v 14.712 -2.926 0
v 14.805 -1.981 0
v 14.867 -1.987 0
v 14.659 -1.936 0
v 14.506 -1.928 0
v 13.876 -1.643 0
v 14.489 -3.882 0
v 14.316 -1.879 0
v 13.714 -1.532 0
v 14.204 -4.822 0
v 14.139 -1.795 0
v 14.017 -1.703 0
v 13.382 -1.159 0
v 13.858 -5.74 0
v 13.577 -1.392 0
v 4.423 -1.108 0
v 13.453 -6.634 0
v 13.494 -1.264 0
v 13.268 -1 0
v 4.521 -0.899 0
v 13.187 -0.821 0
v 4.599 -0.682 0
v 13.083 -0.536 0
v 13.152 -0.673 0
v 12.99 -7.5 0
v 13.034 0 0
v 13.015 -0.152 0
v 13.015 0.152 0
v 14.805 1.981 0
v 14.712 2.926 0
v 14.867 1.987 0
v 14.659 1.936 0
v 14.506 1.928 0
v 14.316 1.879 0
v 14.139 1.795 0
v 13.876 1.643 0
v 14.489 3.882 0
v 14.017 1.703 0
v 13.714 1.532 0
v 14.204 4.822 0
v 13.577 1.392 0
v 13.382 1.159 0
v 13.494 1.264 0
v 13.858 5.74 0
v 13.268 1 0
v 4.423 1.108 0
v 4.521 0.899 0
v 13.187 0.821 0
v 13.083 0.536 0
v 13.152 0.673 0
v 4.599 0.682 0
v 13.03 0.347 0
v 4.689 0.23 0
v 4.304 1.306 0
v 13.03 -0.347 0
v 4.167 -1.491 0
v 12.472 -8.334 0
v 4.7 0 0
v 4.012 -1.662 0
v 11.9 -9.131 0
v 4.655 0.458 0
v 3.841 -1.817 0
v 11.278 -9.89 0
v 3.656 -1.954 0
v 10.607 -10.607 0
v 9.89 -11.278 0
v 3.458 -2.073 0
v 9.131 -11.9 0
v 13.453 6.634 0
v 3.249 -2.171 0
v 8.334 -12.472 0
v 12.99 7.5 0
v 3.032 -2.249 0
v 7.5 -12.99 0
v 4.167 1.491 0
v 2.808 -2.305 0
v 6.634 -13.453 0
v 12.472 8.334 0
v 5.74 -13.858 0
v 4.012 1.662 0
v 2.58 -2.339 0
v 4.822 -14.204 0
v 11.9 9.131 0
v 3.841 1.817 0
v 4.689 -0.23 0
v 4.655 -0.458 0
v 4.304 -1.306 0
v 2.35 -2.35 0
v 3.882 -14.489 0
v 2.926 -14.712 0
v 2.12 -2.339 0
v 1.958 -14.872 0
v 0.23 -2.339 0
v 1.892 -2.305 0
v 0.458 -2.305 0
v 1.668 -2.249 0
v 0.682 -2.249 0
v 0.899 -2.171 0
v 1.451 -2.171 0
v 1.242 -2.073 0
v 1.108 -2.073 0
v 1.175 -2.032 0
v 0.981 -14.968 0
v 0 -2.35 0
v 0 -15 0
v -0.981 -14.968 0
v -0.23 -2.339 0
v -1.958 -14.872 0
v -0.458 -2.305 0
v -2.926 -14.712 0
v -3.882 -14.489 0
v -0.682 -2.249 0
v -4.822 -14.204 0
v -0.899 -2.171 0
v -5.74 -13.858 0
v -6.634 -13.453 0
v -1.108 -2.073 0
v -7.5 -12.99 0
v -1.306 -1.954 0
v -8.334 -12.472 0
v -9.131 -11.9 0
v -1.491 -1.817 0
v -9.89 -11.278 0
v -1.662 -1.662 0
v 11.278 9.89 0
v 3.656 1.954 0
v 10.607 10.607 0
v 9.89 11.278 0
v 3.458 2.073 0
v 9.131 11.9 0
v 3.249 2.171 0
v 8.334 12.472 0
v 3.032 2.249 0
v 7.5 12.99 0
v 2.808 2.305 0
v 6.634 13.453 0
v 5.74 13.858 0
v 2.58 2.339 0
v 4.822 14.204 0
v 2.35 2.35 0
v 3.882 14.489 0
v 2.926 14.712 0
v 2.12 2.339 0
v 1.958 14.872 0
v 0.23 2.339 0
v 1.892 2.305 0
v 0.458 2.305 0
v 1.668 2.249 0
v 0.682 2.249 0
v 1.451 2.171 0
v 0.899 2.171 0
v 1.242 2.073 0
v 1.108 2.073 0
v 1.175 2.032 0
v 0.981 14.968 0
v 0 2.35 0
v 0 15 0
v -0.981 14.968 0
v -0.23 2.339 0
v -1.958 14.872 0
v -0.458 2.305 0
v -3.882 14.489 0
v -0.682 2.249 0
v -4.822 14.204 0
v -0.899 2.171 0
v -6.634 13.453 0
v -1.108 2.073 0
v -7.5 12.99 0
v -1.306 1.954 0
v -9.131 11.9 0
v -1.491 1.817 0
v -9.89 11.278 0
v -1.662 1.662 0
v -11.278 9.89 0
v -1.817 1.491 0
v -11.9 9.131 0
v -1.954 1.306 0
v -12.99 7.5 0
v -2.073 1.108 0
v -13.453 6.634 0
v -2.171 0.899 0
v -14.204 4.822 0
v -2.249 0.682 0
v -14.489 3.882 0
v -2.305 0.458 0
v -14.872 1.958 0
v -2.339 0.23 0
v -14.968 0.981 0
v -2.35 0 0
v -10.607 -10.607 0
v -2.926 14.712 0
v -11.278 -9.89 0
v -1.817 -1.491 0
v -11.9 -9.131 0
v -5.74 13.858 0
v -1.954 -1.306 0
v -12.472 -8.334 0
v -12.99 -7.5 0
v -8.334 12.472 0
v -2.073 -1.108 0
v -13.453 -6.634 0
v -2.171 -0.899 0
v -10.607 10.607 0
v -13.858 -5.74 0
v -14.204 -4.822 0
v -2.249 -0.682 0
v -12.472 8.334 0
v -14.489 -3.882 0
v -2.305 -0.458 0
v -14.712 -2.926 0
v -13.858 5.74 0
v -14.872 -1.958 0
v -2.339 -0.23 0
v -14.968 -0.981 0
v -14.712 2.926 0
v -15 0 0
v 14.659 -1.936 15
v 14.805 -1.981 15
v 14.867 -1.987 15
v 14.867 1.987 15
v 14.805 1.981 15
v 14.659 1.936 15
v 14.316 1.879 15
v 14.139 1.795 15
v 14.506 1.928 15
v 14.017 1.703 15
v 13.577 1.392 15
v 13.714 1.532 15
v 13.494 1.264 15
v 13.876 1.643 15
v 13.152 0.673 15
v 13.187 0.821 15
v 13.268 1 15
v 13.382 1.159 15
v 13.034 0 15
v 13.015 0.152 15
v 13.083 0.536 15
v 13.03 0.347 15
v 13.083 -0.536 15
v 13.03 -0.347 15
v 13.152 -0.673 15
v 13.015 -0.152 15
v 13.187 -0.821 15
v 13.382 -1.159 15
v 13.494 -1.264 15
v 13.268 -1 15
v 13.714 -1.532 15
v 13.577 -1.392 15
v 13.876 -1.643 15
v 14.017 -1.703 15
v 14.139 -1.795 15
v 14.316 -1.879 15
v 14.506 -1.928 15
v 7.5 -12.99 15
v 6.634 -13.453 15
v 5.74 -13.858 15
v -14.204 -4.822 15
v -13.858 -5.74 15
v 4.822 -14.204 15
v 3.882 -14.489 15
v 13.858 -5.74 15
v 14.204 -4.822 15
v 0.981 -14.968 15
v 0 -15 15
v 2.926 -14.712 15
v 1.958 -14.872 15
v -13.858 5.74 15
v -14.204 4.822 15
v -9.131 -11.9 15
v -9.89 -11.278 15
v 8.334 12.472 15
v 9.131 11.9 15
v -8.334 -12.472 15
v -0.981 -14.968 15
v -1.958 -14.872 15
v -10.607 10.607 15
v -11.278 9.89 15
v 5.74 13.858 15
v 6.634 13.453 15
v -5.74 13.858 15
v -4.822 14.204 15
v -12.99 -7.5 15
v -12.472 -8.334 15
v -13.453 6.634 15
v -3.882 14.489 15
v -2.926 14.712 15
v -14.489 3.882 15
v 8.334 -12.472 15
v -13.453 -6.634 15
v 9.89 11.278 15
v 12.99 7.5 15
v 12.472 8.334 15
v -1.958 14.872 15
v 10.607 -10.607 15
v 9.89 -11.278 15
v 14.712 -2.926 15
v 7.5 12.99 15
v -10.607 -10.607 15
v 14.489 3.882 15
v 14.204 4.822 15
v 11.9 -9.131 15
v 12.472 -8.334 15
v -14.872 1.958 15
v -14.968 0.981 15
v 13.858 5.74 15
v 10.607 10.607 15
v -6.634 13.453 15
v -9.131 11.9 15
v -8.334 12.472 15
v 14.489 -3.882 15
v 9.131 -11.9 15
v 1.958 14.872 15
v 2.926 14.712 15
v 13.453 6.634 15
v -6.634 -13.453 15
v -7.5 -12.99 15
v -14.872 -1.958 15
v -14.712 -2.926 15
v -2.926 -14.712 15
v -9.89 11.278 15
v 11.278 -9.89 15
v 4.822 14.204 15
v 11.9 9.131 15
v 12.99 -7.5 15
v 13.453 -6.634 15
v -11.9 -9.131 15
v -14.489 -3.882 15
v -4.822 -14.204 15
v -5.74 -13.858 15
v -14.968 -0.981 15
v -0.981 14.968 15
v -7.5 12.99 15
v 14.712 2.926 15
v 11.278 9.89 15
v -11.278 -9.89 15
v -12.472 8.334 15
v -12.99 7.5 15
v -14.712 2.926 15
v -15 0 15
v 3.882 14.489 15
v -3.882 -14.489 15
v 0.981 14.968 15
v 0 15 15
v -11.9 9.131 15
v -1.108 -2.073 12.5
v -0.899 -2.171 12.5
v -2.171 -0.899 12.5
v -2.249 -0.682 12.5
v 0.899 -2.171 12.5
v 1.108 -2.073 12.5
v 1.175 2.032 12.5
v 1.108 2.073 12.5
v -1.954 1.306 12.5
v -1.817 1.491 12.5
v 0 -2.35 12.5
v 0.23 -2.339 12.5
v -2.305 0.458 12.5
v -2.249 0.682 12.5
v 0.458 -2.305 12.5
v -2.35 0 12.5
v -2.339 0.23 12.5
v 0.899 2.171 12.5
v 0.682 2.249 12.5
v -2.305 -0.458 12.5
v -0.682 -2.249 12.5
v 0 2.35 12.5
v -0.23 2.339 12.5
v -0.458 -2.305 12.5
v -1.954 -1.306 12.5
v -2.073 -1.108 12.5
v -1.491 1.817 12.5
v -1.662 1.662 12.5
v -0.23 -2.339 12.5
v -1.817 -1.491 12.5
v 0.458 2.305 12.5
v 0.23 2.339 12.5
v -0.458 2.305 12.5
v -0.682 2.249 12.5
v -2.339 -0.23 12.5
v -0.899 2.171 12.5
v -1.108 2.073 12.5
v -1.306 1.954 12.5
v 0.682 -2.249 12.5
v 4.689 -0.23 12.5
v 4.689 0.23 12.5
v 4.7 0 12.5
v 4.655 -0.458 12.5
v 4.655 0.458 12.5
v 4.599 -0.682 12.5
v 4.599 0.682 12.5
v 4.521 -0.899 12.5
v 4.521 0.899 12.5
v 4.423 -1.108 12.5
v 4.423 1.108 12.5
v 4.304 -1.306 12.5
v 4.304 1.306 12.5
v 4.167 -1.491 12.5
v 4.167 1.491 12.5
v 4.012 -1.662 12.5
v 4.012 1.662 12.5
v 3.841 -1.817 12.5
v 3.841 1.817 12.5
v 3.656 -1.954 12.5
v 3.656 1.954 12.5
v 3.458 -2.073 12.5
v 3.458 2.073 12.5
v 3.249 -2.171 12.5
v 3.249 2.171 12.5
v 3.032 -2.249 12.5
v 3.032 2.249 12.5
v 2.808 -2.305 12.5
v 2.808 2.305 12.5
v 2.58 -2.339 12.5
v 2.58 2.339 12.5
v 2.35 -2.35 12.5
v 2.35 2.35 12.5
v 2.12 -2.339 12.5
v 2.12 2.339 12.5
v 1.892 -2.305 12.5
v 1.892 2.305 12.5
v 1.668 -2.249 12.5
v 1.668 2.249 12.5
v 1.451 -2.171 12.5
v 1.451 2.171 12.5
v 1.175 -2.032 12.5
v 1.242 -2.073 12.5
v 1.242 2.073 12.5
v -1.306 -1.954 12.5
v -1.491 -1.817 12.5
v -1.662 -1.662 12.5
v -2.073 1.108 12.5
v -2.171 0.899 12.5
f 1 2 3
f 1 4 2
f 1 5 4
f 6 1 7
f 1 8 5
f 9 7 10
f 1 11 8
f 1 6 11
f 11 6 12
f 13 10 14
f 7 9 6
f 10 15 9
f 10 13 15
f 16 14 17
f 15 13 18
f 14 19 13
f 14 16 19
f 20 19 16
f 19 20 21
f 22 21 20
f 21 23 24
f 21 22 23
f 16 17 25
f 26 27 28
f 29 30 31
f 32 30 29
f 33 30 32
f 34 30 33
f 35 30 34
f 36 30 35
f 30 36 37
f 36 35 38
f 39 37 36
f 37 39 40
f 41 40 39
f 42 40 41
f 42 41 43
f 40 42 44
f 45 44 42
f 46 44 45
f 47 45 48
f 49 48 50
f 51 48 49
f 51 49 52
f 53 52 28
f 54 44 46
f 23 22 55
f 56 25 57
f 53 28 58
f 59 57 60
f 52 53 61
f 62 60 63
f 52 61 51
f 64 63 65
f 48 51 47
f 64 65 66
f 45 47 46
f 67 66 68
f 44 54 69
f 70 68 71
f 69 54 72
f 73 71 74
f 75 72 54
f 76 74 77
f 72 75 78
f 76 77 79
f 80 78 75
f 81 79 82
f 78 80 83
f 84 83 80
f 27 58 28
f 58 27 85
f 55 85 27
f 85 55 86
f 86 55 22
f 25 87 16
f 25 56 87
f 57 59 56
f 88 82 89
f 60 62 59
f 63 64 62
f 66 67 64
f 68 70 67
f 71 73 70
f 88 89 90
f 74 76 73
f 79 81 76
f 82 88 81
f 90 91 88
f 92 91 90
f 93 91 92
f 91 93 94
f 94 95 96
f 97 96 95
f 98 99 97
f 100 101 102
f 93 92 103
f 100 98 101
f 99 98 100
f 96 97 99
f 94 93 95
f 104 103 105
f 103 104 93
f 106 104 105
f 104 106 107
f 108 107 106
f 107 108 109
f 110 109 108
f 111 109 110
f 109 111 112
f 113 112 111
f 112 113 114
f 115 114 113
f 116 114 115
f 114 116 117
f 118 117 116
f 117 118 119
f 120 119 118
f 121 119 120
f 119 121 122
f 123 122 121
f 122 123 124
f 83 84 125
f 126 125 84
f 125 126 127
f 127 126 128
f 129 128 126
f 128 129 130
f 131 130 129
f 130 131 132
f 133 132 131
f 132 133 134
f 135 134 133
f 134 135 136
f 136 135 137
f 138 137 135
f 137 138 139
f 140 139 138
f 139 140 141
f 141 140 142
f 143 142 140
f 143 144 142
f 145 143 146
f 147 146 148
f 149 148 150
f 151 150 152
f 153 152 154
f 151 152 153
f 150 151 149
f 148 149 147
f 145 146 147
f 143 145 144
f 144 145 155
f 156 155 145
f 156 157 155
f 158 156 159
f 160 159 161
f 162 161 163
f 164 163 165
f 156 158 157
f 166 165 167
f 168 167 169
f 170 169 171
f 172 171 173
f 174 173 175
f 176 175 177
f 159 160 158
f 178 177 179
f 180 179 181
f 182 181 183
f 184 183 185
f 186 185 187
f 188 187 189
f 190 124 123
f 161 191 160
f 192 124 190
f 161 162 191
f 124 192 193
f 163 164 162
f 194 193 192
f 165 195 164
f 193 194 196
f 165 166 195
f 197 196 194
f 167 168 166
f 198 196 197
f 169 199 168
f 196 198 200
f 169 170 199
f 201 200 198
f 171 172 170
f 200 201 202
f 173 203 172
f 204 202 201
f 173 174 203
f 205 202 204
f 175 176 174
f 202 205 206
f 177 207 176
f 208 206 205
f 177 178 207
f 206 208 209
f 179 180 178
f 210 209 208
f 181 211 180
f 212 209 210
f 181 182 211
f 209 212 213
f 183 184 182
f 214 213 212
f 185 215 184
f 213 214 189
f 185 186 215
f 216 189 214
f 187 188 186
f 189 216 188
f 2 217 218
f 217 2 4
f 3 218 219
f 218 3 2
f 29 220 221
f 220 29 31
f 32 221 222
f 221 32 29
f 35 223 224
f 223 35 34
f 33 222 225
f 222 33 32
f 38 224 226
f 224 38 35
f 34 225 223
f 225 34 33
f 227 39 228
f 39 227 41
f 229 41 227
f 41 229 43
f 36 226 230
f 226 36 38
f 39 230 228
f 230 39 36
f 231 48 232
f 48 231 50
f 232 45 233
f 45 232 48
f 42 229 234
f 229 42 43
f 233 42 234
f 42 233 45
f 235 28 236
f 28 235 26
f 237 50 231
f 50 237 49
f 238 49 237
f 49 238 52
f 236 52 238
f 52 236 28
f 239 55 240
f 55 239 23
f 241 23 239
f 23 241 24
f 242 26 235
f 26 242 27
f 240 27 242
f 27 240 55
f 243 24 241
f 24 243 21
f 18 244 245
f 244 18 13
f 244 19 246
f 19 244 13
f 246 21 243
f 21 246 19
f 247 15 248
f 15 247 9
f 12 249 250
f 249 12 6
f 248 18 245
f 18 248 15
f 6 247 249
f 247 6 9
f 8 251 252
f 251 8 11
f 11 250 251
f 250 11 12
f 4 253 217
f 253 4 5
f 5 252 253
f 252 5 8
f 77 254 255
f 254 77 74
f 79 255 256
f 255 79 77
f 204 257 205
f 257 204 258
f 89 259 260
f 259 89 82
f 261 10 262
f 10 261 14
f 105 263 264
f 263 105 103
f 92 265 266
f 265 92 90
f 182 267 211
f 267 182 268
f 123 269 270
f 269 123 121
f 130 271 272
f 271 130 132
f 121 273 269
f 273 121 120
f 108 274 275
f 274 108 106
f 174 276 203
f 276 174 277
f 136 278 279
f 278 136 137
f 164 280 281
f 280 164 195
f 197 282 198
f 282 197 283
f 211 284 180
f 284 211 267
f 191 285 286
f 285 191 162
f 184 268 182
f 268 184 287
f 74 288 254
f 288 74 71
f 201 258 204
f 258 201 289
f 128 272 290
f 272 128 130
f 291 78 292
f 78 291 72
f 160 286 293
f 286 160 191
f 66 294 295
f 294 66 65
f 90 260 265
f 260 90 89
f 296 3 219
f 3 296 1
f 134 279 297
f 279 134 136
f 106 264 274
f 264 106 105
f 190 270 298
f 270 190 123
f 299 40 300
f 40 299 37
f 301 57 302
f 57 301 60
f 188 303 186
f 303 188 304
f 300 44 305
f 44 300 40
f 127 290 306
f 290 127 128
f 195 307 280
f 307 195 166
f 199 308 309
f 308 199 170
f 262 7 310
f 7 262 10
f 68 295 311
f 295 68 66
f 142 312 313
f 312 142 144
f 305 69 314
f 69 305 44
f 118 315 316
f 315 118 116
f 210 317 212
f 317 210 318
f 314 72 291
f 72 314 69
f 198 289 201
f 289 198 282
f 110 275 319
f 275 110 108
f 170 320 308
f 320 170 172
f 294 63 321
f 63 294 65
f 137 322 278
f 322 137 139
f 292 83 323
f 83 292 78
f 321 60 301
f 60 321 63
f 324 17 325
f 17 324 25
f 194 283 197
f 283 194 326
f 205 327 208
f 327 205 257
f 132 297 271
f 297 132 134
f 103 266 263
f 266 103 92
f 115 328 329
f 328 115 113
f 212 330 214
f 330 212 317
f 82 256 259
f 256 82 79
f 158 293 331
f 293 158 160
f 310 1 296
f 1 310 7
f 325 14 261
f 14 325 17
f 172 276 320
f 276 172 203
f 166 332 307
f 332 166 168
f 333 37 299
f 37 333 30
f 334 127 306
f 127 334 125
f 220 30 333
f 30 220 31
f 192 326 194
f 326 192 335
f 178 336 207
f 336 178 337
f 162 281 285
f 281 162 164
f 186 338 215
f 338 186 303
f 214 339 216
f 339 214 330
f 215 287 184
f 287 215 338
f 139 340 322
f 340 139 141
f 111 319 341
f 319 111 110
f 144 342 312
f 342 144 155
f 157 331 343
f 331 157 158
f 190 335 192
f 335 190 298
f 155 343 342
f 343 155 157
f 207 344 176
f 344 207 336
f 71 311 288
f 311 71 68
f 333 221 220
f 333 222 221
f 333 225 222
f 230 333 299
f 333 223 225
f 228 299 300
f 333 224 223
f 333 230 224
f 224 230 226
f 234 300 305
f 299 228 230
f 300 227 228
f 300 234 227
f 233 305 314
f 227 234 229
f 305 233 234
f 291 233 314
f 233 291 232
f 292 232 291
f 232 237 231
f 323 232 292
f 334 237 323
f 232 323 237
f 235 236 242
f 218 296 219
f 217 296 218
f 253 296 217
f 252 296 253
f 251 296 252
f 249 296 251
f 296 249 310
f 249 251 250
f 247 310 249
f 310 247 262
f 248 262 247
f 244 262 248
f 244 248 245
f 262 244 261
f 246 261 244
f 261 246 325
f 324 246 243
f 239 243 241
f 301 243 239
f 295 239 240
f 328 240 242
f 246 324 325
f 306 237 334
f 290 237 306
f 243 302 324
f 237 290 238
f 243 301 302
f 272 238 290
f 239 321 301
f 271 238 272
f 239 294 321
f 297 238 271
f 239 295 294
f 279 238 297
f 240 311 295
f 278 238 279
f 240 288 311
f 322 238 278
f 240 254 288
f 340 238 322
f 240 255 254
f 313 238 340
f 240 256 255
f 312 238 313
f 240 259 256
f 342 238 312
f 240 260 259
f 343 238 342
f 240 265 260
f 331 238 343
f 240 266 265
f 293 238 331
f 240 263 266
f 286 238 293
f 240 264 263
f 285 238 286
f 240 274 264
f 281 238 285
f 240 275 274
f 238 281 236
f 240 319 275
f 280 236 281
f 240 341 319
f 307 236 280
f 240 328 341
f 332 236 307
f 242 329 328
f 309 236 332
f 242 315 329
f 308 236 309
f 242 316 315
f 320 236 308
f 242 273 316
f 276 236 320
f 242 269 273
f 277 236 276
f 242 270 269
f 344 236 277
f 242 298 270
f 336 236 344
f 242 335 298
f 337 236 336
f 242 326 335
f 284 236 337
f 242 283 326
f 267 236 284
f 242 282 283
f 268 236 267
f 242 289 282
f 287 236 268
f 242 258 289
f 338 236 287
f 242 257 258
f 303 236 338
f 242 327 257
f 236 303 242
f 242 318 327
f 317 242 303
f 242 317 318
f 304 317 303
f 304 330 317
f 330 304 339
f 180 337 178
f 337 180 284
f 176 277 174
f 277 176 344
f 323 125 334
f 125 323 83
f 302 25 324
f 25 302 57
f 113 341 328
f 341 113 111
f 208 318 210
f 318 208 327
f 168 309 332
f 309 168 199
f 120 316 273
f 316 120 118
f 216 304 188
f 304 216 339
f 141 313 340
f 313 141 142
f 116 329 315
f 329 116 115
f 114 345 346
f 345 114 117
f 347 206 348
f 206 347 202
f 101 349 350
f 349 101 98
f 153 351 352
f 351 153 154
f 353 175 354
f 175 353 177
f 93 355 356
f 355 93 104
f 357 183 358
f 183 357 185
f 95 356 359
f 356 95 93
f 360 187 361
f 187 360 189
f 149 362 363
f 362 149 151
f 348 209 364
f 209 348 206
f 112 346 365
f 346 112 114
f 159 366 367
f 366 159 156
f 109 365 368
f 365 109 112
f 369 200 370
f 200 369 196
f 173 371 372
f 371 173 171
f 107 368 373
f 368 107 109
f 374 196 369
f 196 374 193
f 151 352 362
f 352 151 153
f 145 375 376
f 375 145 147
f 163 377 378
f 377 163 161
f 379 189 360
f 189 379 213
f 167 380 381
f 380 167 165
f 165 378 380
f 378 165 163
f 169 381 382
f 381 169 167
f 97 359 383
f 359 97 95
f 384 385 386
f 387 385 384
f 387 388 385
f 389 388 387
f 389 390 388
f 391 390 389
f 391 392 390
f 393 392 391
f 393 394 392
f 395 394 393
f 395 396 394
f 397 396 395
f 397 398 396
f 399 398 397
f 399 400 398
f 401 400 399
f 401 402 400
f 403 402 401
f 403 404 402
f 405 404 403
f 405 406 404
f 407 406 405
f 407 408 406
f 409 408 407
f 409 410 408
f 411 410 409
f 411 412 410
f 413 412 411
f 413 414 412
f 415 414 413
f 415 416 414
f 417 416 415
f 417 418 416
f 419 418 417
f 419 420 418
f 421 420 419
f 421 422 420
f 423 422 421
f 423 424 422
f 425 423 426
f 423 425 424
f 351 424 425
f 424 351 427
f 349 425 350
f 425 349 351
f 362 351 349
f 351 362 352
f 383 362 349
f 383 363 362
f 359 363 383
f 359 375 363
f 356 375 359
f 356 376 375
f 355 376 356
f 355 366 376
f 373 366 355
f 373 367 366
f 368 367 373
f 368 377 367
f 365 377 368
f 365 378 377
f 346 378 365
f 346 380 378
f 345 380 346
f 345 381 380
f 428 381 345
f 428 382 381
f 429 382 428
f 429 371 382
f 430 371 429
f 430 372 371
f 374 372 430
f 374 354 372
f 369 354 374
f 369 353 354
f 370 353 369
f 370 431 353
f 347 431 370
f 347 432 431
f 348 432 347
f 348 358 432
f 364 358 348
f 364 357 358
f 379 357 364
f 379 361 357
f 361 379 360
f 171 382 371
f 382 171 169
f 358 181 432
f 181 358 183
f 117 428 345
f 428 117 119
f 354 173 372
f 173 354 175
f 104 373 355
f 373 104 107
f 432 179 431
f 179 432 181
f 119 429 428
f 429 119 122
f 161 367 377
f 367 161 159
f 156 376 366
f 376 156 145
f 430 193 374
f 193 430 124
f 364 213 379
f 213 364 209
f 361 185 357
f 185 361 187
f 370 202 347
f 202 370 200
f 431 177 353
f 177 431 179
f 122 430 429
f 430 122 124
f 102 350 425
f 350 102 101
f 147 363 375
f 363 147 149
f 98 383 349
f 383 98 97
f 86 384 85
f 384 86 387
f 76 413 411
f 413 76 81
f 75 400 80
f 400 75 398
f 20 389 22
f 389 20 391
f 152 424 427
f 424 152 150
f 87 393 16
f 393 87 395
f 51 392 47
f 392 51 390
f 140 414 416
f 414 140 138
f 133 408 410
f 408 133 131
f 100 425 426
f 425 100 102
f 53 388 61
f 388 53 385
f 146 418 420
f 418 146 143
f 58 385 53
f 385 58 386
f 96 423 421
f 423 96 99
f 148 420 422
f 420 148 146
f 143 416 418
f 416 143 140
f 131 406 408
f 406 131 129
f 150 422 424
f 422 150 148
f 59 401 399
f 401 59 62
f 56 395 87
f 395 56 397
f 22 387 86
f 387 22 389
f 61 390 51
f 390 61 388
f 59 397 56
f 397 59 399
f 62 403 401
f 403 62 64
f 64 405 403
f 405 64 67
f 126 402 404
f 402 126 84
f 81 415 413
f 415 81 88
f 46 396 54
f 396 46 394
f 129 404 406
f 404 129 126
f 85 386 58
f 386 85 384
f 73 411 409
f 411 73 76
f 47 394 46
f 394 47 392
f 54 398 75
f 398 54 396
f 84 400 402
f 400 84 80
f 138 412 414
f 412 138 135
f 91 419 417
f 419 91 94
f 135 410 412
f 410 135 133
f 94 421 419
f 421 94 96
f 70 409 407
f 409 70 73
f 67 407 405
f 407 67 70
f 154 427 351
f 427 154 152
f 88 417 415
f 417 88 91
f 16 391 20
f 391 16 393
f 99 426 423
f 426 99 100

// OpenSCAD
// Replacement knob for hotplate stirrer with D-shaft
// Print orientation: D-flat side down on bed (z = 0)

$fn = 96;

// --- Dimensions (mm) ---
knob_d        = 30;   // knob outer diameter
knob_h        = 15;   // knob height
shaft_d       = 6.2;  // D-shaft diameter
bore_flat     = 4.7;  // distance from D-flat to opposite side
bore_depth    = 12;   // blind bore depth from bottom face
groove_count  = 18;   // number of grip grooves
groove_d      = 2;    // groove diameter (half-cylinder)
pointer_w     = 1.5;  // pointer groove width
pointer_d     = pointer_w; // pointer groove depth (same as width)
eps           = 0.5;  // overcut for clean differences

// Derived
knob_r = knob_d / 2;

difference() {
    // Main cylinder
    cylinder(d = knob_d, h = knob_h);

    // D-shaped blind bore, centred on axis, flat on +x side
    translate([0, 0, -eps])
        cylinder(d = bore_flat, h = bore_depth + 2 * eps, $fn = 64);
    translate([bore_flat / 2, 0, -eps])
        cylinder(d = bore_flat, h = bore_depth + 2 * eps, $fn = 64);

    // Grip grooves: vertical half-cylinders centred on outer surface
    for (i = [0 : groove_count - 1]) {
        a = i * 360 / groove_count;
        translate([knob_r, 0, 0])
            rotate([0, 0, a])
                translate([0, -groove_d / 2, 0])
                    cylinder(d = groove_d, h = knob_h + 2 * eps, $fn = 32);
    }

    // Pointer groove: radial slot from centre to edge, along +x
    translate([-(pointer_d / 2), 0, 0])
        rotate([0, 90, 0])
            linear_extrude(height = pointer_d)
                translate([0, -pointer_w / 2, 0])
                    cube([knob_r, pointer_w, pointer_d]);
}
